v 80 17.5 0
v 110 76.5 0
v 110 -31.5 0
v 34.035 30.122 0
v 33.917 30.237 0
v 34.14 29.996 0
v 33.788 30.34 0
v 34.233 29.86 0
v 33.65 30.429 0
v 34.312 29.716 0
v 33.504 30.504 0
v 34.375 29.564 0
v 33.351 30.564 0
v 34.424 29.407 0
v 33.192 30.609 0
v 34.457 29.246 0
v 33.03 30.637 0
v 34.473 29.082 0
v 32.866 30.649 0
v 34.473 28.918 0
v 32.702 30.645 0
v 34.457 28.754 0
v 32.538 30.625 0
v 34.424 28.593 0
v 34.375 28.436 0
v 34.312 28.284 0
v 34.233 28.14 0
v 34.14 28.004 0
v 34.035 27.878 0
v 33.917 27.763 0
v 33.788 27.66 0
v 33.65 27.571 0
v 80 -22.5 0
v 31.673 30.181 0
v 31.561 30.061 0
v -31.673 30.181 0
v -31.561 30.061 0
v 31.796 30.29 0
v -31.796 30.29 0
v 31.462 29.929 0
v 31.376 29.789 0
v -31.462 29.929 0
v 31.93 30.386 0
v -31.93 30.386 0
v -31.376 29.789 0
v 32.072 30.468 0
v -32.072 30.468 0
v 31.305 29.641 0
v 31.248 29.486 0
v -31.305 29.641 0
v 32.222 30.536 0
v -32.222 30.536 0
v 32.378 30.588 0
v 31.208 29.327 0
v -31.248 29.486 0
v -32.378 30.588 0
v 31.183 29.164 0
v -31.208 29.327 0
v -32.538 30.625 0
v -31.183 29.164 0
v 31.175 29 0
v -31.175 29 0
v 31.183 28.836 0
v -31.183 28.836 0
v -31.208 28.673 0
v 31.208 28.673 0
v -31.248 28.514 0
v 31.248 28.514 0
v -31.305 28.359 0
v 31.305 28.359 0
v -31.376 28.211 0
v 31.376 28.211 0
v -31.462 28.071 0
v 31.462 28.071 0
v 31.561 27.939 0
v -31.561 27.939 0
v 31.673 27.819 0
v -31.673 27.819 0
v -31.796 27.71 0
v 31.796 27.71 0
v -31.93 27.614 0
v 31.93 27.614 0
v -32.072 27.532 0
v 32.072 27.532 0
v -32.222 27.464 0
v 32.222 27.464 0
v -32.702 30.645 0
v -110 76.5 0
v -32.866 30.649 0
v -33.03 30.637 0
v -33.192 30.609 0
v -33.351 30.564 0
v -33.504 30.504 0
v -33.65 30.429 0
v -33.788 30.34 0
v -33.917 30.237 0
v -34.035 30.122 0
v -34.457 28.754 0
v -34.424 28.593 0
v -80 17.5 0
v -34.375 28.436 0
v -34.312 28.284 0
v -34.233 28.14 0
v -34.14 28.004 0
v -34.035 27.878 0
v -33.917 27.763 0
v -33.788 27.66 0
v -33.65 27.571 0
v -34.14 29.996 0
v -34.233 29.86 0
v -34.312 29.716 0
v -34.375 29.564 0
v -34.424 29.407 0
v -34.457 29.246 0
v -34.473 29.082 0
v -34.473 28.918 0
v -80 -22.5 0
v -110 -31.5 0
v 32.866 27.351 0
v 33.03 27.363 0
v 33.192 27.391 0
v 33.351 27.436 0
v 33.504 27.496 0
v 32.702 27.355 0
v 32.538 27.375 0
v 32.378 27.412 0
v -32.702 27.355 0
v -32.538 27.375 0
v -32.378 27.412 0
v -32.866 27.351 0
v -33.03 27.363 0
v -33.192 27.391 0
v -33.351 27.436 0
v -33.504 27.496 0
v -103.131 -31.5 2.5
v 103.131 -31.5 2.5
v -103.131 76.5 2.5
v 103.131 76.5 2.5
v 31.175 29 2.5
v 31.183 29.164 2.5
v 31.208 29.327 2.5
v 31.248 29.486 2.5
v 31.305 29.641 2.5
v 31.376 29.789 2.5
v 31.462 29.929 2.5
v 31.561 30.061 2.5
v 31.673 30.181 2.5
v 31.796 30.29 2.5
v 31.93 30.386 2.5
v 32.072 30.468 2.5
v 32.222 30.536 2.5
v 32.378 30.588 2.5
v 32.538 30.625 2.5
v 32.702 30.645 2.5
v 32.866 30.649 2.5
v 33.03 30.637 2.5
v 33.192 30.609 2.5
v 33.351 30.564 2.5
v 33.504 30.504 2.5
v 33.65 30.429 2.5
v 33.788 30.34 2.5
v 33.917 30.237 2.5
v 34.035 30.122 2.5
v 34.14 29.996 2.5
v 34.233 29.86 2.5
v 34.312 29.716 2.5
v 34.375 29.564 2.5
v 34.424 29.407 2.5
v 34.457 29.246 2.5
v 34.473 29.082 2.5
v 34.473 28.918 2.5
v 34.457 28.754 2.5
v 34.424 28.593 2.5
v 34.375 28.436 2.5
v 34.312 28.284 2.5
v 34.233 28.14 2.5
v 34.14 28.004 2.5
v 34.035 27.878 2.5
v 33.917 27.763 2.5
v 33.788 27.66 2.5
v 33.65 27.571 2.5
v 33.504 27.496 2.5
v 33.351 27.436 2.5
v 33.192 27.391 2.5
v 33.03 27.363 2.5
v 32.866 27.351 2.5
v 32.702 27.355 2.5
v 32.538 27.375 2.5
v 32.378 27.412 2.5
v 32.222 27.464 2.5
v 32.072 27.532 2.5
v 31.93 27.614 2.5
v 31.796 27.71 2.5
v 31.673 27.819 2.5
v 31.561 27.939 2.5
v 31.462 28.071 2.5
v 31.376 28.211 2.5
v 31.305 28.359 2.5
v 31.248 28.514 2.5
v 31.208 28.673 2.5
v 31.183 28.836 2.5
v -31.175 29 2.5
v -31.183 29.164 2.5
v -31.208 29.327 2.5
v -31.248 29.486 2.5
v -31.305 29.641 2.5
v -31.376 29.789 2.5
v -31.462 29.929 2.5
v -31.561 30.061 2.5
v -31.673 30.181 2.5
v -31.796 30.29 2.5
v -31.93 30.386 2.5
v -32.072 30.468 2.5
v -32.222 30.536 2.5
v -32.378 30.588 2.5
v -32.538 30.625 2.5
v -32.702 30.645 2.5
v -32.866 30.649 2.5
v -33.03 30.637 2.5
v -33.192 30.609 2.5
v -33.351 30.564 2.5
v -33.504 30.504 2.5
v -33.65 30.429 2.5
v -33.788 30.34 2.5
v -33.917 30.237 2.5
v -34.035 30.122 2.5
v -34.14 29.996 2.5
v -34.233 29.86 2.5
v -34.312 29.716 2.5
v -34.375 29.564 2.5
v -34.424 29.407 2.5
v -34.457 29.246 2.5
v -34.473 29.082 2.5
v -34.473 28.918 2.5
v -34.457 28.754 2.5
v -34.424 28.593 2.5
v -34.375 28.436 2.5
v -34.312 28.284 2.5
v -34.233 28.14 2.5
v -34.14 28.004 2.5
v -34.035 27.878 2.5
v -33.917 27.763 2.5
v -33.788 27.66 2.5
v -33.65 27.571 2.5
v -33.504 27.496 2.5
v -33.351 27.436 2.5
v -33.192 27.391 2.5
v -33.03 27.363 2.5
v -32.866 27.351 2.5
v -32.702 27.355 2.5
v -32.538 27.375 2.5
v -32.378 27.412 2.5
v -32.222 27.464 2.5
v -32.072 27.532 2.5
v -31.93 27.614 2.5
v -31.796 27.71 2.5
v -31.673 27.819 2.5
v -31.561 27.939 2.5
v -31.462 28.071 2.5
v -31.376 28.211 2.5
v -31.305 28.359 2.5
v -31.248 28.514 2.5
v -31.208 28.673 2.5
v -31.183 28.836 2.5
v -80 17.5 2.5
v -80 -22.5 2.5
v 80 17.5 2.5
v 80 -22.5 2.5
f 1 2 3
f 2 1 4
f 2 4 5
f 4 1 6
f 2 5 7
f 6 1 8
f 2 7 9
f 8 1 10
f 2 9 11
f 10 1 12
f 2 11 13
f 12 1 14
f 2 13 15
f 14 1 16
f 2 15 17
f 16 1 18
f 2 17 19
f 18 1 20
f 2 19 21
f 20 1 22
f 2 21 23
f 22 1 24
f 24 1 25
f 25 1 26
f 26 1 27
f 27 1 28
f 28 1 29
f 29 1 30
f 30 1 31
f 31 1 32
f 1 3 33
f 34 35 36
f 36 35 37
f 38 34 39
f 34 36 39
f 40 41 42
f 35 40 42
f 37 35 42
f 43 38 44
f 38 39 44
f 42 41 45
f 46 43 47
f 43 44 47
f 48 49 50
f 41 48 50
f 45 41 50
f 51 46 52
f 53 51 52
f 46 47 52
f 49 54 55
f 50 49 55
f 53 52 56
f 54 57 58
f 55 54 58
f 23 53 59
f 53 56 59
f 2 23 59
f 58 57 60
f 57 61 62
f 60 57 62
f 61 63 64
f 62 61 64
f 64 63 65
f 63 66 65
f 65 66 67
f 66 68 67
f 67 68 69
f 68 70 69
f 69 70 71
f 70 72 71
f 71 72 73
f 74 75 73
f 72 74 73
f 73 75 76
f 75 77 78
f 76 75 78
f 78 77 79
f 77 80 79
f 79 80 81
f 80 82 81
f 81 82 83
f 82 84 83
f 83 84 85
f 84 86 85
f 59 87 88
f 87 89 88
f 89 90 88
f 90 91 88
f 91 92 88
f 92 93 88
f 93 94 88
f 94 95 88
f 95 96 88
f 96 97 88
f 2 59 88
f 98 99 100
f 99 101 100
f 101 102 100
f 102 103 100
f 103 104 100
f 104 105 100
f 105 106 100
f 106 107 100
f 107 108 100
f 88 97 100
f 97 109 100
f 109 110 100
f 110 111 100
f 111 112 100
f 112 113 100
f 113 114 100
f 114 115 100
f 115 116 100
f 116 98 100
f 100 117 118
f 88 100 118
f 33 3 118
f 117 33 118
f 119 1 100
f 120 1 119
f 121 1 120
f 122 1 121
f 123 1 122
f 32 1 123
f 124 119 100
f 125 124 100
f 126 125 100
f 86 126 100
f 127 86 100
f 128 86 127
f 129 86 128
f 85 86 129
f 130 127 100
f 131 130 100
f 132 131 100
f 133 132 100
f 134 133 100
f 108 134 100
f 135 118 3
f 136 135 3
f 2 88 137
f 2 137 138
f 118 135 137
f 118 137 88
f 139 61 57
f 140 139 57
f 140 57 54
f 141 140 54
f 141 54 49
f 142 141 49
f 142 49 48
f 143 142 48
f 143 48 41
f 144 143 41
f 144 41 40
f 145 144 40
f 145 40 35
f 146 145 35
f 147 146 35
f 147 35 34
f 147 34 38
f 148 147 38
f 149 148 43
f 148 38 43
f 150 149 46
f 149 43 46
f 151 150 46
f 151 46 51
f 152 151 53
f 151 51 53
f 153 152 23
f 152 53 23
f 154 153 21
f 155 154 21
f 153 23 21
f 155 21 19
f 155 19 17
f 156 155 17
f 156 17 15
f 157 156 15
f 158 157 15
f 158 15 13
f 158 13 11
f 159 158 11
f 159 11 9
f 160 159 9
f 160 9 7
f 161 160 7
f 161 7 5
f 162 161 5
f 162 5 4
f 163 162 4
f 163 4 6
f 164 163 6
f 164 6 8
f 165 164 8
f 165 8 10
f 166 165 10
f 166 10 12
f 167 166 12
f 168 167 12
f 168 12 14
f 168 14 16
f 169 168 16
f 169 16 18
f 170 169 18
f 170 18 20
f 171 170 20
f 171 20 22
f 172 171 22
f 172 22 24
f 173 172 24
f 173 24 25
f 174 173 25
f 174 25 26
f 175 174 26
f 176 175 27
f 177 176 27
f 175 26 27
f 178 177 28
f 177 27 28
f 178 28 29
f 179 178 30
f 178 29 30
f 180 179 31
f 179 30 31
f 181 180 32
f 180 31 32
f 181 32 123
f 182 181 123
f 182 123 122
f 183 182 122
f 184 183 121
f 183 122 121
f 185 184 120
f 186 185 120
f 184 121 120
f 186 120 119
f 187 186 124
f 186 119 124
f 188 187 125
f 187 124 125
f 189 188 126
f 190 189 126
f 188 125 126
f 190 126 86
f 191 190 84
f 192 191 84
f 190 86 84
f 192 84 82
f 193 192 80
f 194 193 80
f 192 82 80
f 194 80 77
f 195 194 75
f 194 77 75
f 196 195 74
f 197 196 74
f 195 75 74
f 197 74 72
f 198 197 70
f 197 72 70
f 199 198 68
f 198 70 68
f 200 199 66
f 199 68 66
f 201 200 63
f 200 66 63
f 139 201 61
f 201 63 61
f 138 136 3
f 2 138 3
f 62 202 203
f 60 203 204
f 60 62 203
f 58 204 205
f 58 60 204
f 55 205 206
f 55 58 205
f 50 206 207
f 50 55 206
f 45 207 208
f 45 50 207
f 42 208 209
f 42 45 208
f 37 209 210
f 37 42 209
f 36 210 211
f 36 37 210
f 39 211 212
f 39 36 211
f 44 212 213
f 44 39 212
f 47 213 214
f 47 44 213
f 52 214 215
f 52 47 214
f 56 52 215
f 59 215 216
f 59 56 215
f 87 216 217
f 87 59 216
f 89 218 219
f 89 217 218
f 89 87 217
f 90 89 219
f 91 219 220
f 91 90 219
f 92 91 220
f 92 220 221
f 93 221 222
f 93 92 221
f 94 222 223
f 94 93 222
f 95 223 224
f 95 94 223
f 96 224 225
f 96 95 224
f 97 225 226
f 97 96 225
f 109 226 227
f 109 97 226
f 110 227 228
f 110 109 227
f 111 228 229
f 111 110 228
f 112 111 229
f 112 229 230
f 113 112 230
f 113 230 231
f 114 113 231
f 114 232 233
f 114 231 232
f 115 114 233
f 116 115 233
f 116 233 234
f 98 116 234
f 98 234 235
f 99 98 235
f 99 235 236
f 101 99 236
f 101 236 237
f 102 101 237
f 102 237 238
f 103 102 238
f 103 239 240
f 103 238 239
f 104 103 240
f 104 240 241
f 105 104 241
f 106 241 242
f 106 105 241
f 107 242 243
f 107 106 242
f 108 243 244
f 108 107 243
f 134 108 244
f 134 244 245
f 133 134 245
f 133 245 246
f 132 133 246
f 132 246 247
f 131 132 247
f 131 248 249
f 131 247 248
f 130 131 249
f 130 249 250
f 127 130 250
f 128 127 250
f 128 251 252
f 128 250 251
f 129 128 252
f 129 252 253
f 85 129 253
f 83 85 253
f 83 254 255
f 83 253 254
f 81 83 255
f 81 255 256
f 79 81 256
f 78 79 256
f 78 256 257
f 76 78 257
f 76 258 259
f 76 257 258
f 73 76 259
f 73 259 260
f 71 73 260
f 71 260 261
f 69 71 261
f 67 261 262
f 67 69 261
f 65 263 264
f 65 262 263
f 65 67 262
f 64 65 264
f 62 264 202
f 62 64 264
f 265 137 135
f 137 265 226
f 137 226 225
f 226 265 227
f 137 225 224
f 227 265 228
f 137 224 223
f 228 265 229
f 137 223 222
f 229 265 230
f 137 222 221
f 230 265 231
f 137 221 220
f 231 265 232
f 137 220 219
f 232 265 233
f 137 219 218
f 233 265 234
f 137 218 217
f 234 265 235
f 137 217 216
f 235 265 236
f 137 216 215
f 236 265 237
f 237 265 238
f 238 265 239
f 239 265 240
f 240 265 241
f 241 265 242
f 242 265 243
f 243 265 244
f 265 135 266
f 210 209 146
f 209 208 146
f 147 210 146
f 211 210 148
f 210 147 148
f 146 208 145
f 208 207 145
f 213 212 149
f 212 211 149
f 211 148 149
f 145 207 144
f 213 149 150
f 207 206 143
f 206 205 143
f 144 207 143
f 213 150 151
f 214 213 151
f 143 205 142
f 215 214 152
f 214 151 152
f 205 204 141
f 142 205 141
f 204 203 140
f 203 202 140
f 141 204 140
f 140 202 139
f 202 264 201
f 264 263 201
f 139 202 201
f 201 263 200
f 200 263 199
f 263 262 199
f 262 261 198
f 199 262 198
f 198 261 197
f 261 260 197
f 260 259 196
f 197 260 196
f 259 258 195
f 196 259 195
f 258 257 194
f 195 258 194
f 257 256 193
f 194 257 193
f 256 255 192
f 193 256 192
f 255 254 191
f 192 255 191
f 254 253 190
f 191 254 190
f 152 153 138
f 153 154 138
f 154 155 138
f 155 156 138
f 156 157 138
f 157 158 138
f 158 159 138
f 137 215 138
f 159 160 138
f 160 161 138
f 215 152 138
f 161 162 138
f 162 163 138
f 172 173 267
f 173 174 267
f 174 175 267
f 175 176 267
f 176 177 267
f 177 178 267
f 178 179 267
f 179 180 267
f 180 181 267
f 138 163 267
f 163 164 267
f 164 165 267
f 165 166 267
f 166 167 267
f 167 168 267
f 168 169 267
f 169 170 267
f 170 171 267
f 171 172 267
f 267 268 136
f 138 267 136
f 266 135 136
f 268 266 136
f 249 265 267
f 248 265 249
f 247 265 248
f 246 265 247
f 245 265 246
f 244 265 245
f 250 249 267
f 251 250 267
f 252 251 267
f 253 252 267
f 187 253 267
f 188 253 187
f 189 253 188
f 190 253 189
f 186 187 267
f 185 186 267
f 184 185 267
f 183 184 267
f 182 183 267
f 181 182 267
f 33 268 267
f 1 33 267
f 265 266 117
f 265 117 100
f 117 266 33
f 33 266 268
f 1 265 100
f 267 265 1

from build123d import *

# Parameters (mm, degrees)
SKETCH1_W           = 175
SKETCH1_H           = 63
BOSS_EXTRUDE1_DEPTH = 2.5
SKETCH2_W           = 160
SKETCH2_H           = 40
CUT_EXTRUDE1_DEPTH  = 2.5
SKETCH5_W           = 175
SKETCH5_H           = 45
BOSS_EXTRUDE3_DEPTH = 2.5
BOSS_EXTRUDE2_DEPTH = 108
SKETCH4_R           = 1.65
CUT_EXTRUDE2_DEPTH  = 3.5


with BuildPart() as part:
    # Sketch1 → Boss-Extrude1 (new body)
    with BuildSketch(Plane.XY):
        Rectangle(SKETCH1_W, SKETCH1_H)
    extrude(amount=BOSS_EXTRUDE1_DEPTH)

    # Sketch2 → Cut-Extrude1 (cut)
    with BuildSketch(Plane.XY.offset(2.5)):
        with Locations((0, -2.5)):
            Rectangle(SKETCH2_W, SKETCH2_H)
    extrude(amount=-CUT_EXTRUDE1_DEPTH, mode=Mode.SUBTRACT)

    # Sketch5 → Boss-Extrude3 (add)
    with BuildSketch(Plane.XY.offset(2.5)):
        with Locations((0, 54)):
            Rectangle(SKETCH5_W, SKETCH5_H)
    extrude(amount=-BOSS_EXTRUDE3_DEPTH)

    # Sketch3 → Boss-Extrude2 (add)
    with BuildSketch(Plane(origin=(0, -31.5, 0), x_dir=(1, 0, 0), z_dir=(0, 1, 0))):
        Polygon((-87.5, -2.5), (-103.131306451, -2.5), (-110, 0), (-87.5, 0), align=None)
    boss_extrude2 = extrude(amount=BOSS_EXTRUDE2_DEPTH)

    # Mirror1: Boss-Extrude2 across plane
    add(boss_extrude2.mirror(Plane(origin=(0, 0, 0), x_dir=(0, 0, 1), z_dir=(1, 0, 0))))

    # Sketch4 → Cut-Extrude2 (cut, through all)
    with BuildSketch(Plane(origin=(0, 0, 0), x_dir=(-1, 0, 0), z_dir=(0, 0, -1))):
        with Locations((-32.825, 29)):
            Circle(SKETCH4_R)
    cut_extrude2 = extrude(amount=-CUT_EXTRUDE2_DEPTH, mode=Mode.SUBTRACT)

    # Mirror2: Cut-Extrude2 across plane
    add(cut_extrude2.mirror(Plane(origin=(0, 0, 0), x_dir=(0, 0, 1), z_dir=(1, 0, 0))), mode=Mode.SUBTRACT)


solid = part.part
